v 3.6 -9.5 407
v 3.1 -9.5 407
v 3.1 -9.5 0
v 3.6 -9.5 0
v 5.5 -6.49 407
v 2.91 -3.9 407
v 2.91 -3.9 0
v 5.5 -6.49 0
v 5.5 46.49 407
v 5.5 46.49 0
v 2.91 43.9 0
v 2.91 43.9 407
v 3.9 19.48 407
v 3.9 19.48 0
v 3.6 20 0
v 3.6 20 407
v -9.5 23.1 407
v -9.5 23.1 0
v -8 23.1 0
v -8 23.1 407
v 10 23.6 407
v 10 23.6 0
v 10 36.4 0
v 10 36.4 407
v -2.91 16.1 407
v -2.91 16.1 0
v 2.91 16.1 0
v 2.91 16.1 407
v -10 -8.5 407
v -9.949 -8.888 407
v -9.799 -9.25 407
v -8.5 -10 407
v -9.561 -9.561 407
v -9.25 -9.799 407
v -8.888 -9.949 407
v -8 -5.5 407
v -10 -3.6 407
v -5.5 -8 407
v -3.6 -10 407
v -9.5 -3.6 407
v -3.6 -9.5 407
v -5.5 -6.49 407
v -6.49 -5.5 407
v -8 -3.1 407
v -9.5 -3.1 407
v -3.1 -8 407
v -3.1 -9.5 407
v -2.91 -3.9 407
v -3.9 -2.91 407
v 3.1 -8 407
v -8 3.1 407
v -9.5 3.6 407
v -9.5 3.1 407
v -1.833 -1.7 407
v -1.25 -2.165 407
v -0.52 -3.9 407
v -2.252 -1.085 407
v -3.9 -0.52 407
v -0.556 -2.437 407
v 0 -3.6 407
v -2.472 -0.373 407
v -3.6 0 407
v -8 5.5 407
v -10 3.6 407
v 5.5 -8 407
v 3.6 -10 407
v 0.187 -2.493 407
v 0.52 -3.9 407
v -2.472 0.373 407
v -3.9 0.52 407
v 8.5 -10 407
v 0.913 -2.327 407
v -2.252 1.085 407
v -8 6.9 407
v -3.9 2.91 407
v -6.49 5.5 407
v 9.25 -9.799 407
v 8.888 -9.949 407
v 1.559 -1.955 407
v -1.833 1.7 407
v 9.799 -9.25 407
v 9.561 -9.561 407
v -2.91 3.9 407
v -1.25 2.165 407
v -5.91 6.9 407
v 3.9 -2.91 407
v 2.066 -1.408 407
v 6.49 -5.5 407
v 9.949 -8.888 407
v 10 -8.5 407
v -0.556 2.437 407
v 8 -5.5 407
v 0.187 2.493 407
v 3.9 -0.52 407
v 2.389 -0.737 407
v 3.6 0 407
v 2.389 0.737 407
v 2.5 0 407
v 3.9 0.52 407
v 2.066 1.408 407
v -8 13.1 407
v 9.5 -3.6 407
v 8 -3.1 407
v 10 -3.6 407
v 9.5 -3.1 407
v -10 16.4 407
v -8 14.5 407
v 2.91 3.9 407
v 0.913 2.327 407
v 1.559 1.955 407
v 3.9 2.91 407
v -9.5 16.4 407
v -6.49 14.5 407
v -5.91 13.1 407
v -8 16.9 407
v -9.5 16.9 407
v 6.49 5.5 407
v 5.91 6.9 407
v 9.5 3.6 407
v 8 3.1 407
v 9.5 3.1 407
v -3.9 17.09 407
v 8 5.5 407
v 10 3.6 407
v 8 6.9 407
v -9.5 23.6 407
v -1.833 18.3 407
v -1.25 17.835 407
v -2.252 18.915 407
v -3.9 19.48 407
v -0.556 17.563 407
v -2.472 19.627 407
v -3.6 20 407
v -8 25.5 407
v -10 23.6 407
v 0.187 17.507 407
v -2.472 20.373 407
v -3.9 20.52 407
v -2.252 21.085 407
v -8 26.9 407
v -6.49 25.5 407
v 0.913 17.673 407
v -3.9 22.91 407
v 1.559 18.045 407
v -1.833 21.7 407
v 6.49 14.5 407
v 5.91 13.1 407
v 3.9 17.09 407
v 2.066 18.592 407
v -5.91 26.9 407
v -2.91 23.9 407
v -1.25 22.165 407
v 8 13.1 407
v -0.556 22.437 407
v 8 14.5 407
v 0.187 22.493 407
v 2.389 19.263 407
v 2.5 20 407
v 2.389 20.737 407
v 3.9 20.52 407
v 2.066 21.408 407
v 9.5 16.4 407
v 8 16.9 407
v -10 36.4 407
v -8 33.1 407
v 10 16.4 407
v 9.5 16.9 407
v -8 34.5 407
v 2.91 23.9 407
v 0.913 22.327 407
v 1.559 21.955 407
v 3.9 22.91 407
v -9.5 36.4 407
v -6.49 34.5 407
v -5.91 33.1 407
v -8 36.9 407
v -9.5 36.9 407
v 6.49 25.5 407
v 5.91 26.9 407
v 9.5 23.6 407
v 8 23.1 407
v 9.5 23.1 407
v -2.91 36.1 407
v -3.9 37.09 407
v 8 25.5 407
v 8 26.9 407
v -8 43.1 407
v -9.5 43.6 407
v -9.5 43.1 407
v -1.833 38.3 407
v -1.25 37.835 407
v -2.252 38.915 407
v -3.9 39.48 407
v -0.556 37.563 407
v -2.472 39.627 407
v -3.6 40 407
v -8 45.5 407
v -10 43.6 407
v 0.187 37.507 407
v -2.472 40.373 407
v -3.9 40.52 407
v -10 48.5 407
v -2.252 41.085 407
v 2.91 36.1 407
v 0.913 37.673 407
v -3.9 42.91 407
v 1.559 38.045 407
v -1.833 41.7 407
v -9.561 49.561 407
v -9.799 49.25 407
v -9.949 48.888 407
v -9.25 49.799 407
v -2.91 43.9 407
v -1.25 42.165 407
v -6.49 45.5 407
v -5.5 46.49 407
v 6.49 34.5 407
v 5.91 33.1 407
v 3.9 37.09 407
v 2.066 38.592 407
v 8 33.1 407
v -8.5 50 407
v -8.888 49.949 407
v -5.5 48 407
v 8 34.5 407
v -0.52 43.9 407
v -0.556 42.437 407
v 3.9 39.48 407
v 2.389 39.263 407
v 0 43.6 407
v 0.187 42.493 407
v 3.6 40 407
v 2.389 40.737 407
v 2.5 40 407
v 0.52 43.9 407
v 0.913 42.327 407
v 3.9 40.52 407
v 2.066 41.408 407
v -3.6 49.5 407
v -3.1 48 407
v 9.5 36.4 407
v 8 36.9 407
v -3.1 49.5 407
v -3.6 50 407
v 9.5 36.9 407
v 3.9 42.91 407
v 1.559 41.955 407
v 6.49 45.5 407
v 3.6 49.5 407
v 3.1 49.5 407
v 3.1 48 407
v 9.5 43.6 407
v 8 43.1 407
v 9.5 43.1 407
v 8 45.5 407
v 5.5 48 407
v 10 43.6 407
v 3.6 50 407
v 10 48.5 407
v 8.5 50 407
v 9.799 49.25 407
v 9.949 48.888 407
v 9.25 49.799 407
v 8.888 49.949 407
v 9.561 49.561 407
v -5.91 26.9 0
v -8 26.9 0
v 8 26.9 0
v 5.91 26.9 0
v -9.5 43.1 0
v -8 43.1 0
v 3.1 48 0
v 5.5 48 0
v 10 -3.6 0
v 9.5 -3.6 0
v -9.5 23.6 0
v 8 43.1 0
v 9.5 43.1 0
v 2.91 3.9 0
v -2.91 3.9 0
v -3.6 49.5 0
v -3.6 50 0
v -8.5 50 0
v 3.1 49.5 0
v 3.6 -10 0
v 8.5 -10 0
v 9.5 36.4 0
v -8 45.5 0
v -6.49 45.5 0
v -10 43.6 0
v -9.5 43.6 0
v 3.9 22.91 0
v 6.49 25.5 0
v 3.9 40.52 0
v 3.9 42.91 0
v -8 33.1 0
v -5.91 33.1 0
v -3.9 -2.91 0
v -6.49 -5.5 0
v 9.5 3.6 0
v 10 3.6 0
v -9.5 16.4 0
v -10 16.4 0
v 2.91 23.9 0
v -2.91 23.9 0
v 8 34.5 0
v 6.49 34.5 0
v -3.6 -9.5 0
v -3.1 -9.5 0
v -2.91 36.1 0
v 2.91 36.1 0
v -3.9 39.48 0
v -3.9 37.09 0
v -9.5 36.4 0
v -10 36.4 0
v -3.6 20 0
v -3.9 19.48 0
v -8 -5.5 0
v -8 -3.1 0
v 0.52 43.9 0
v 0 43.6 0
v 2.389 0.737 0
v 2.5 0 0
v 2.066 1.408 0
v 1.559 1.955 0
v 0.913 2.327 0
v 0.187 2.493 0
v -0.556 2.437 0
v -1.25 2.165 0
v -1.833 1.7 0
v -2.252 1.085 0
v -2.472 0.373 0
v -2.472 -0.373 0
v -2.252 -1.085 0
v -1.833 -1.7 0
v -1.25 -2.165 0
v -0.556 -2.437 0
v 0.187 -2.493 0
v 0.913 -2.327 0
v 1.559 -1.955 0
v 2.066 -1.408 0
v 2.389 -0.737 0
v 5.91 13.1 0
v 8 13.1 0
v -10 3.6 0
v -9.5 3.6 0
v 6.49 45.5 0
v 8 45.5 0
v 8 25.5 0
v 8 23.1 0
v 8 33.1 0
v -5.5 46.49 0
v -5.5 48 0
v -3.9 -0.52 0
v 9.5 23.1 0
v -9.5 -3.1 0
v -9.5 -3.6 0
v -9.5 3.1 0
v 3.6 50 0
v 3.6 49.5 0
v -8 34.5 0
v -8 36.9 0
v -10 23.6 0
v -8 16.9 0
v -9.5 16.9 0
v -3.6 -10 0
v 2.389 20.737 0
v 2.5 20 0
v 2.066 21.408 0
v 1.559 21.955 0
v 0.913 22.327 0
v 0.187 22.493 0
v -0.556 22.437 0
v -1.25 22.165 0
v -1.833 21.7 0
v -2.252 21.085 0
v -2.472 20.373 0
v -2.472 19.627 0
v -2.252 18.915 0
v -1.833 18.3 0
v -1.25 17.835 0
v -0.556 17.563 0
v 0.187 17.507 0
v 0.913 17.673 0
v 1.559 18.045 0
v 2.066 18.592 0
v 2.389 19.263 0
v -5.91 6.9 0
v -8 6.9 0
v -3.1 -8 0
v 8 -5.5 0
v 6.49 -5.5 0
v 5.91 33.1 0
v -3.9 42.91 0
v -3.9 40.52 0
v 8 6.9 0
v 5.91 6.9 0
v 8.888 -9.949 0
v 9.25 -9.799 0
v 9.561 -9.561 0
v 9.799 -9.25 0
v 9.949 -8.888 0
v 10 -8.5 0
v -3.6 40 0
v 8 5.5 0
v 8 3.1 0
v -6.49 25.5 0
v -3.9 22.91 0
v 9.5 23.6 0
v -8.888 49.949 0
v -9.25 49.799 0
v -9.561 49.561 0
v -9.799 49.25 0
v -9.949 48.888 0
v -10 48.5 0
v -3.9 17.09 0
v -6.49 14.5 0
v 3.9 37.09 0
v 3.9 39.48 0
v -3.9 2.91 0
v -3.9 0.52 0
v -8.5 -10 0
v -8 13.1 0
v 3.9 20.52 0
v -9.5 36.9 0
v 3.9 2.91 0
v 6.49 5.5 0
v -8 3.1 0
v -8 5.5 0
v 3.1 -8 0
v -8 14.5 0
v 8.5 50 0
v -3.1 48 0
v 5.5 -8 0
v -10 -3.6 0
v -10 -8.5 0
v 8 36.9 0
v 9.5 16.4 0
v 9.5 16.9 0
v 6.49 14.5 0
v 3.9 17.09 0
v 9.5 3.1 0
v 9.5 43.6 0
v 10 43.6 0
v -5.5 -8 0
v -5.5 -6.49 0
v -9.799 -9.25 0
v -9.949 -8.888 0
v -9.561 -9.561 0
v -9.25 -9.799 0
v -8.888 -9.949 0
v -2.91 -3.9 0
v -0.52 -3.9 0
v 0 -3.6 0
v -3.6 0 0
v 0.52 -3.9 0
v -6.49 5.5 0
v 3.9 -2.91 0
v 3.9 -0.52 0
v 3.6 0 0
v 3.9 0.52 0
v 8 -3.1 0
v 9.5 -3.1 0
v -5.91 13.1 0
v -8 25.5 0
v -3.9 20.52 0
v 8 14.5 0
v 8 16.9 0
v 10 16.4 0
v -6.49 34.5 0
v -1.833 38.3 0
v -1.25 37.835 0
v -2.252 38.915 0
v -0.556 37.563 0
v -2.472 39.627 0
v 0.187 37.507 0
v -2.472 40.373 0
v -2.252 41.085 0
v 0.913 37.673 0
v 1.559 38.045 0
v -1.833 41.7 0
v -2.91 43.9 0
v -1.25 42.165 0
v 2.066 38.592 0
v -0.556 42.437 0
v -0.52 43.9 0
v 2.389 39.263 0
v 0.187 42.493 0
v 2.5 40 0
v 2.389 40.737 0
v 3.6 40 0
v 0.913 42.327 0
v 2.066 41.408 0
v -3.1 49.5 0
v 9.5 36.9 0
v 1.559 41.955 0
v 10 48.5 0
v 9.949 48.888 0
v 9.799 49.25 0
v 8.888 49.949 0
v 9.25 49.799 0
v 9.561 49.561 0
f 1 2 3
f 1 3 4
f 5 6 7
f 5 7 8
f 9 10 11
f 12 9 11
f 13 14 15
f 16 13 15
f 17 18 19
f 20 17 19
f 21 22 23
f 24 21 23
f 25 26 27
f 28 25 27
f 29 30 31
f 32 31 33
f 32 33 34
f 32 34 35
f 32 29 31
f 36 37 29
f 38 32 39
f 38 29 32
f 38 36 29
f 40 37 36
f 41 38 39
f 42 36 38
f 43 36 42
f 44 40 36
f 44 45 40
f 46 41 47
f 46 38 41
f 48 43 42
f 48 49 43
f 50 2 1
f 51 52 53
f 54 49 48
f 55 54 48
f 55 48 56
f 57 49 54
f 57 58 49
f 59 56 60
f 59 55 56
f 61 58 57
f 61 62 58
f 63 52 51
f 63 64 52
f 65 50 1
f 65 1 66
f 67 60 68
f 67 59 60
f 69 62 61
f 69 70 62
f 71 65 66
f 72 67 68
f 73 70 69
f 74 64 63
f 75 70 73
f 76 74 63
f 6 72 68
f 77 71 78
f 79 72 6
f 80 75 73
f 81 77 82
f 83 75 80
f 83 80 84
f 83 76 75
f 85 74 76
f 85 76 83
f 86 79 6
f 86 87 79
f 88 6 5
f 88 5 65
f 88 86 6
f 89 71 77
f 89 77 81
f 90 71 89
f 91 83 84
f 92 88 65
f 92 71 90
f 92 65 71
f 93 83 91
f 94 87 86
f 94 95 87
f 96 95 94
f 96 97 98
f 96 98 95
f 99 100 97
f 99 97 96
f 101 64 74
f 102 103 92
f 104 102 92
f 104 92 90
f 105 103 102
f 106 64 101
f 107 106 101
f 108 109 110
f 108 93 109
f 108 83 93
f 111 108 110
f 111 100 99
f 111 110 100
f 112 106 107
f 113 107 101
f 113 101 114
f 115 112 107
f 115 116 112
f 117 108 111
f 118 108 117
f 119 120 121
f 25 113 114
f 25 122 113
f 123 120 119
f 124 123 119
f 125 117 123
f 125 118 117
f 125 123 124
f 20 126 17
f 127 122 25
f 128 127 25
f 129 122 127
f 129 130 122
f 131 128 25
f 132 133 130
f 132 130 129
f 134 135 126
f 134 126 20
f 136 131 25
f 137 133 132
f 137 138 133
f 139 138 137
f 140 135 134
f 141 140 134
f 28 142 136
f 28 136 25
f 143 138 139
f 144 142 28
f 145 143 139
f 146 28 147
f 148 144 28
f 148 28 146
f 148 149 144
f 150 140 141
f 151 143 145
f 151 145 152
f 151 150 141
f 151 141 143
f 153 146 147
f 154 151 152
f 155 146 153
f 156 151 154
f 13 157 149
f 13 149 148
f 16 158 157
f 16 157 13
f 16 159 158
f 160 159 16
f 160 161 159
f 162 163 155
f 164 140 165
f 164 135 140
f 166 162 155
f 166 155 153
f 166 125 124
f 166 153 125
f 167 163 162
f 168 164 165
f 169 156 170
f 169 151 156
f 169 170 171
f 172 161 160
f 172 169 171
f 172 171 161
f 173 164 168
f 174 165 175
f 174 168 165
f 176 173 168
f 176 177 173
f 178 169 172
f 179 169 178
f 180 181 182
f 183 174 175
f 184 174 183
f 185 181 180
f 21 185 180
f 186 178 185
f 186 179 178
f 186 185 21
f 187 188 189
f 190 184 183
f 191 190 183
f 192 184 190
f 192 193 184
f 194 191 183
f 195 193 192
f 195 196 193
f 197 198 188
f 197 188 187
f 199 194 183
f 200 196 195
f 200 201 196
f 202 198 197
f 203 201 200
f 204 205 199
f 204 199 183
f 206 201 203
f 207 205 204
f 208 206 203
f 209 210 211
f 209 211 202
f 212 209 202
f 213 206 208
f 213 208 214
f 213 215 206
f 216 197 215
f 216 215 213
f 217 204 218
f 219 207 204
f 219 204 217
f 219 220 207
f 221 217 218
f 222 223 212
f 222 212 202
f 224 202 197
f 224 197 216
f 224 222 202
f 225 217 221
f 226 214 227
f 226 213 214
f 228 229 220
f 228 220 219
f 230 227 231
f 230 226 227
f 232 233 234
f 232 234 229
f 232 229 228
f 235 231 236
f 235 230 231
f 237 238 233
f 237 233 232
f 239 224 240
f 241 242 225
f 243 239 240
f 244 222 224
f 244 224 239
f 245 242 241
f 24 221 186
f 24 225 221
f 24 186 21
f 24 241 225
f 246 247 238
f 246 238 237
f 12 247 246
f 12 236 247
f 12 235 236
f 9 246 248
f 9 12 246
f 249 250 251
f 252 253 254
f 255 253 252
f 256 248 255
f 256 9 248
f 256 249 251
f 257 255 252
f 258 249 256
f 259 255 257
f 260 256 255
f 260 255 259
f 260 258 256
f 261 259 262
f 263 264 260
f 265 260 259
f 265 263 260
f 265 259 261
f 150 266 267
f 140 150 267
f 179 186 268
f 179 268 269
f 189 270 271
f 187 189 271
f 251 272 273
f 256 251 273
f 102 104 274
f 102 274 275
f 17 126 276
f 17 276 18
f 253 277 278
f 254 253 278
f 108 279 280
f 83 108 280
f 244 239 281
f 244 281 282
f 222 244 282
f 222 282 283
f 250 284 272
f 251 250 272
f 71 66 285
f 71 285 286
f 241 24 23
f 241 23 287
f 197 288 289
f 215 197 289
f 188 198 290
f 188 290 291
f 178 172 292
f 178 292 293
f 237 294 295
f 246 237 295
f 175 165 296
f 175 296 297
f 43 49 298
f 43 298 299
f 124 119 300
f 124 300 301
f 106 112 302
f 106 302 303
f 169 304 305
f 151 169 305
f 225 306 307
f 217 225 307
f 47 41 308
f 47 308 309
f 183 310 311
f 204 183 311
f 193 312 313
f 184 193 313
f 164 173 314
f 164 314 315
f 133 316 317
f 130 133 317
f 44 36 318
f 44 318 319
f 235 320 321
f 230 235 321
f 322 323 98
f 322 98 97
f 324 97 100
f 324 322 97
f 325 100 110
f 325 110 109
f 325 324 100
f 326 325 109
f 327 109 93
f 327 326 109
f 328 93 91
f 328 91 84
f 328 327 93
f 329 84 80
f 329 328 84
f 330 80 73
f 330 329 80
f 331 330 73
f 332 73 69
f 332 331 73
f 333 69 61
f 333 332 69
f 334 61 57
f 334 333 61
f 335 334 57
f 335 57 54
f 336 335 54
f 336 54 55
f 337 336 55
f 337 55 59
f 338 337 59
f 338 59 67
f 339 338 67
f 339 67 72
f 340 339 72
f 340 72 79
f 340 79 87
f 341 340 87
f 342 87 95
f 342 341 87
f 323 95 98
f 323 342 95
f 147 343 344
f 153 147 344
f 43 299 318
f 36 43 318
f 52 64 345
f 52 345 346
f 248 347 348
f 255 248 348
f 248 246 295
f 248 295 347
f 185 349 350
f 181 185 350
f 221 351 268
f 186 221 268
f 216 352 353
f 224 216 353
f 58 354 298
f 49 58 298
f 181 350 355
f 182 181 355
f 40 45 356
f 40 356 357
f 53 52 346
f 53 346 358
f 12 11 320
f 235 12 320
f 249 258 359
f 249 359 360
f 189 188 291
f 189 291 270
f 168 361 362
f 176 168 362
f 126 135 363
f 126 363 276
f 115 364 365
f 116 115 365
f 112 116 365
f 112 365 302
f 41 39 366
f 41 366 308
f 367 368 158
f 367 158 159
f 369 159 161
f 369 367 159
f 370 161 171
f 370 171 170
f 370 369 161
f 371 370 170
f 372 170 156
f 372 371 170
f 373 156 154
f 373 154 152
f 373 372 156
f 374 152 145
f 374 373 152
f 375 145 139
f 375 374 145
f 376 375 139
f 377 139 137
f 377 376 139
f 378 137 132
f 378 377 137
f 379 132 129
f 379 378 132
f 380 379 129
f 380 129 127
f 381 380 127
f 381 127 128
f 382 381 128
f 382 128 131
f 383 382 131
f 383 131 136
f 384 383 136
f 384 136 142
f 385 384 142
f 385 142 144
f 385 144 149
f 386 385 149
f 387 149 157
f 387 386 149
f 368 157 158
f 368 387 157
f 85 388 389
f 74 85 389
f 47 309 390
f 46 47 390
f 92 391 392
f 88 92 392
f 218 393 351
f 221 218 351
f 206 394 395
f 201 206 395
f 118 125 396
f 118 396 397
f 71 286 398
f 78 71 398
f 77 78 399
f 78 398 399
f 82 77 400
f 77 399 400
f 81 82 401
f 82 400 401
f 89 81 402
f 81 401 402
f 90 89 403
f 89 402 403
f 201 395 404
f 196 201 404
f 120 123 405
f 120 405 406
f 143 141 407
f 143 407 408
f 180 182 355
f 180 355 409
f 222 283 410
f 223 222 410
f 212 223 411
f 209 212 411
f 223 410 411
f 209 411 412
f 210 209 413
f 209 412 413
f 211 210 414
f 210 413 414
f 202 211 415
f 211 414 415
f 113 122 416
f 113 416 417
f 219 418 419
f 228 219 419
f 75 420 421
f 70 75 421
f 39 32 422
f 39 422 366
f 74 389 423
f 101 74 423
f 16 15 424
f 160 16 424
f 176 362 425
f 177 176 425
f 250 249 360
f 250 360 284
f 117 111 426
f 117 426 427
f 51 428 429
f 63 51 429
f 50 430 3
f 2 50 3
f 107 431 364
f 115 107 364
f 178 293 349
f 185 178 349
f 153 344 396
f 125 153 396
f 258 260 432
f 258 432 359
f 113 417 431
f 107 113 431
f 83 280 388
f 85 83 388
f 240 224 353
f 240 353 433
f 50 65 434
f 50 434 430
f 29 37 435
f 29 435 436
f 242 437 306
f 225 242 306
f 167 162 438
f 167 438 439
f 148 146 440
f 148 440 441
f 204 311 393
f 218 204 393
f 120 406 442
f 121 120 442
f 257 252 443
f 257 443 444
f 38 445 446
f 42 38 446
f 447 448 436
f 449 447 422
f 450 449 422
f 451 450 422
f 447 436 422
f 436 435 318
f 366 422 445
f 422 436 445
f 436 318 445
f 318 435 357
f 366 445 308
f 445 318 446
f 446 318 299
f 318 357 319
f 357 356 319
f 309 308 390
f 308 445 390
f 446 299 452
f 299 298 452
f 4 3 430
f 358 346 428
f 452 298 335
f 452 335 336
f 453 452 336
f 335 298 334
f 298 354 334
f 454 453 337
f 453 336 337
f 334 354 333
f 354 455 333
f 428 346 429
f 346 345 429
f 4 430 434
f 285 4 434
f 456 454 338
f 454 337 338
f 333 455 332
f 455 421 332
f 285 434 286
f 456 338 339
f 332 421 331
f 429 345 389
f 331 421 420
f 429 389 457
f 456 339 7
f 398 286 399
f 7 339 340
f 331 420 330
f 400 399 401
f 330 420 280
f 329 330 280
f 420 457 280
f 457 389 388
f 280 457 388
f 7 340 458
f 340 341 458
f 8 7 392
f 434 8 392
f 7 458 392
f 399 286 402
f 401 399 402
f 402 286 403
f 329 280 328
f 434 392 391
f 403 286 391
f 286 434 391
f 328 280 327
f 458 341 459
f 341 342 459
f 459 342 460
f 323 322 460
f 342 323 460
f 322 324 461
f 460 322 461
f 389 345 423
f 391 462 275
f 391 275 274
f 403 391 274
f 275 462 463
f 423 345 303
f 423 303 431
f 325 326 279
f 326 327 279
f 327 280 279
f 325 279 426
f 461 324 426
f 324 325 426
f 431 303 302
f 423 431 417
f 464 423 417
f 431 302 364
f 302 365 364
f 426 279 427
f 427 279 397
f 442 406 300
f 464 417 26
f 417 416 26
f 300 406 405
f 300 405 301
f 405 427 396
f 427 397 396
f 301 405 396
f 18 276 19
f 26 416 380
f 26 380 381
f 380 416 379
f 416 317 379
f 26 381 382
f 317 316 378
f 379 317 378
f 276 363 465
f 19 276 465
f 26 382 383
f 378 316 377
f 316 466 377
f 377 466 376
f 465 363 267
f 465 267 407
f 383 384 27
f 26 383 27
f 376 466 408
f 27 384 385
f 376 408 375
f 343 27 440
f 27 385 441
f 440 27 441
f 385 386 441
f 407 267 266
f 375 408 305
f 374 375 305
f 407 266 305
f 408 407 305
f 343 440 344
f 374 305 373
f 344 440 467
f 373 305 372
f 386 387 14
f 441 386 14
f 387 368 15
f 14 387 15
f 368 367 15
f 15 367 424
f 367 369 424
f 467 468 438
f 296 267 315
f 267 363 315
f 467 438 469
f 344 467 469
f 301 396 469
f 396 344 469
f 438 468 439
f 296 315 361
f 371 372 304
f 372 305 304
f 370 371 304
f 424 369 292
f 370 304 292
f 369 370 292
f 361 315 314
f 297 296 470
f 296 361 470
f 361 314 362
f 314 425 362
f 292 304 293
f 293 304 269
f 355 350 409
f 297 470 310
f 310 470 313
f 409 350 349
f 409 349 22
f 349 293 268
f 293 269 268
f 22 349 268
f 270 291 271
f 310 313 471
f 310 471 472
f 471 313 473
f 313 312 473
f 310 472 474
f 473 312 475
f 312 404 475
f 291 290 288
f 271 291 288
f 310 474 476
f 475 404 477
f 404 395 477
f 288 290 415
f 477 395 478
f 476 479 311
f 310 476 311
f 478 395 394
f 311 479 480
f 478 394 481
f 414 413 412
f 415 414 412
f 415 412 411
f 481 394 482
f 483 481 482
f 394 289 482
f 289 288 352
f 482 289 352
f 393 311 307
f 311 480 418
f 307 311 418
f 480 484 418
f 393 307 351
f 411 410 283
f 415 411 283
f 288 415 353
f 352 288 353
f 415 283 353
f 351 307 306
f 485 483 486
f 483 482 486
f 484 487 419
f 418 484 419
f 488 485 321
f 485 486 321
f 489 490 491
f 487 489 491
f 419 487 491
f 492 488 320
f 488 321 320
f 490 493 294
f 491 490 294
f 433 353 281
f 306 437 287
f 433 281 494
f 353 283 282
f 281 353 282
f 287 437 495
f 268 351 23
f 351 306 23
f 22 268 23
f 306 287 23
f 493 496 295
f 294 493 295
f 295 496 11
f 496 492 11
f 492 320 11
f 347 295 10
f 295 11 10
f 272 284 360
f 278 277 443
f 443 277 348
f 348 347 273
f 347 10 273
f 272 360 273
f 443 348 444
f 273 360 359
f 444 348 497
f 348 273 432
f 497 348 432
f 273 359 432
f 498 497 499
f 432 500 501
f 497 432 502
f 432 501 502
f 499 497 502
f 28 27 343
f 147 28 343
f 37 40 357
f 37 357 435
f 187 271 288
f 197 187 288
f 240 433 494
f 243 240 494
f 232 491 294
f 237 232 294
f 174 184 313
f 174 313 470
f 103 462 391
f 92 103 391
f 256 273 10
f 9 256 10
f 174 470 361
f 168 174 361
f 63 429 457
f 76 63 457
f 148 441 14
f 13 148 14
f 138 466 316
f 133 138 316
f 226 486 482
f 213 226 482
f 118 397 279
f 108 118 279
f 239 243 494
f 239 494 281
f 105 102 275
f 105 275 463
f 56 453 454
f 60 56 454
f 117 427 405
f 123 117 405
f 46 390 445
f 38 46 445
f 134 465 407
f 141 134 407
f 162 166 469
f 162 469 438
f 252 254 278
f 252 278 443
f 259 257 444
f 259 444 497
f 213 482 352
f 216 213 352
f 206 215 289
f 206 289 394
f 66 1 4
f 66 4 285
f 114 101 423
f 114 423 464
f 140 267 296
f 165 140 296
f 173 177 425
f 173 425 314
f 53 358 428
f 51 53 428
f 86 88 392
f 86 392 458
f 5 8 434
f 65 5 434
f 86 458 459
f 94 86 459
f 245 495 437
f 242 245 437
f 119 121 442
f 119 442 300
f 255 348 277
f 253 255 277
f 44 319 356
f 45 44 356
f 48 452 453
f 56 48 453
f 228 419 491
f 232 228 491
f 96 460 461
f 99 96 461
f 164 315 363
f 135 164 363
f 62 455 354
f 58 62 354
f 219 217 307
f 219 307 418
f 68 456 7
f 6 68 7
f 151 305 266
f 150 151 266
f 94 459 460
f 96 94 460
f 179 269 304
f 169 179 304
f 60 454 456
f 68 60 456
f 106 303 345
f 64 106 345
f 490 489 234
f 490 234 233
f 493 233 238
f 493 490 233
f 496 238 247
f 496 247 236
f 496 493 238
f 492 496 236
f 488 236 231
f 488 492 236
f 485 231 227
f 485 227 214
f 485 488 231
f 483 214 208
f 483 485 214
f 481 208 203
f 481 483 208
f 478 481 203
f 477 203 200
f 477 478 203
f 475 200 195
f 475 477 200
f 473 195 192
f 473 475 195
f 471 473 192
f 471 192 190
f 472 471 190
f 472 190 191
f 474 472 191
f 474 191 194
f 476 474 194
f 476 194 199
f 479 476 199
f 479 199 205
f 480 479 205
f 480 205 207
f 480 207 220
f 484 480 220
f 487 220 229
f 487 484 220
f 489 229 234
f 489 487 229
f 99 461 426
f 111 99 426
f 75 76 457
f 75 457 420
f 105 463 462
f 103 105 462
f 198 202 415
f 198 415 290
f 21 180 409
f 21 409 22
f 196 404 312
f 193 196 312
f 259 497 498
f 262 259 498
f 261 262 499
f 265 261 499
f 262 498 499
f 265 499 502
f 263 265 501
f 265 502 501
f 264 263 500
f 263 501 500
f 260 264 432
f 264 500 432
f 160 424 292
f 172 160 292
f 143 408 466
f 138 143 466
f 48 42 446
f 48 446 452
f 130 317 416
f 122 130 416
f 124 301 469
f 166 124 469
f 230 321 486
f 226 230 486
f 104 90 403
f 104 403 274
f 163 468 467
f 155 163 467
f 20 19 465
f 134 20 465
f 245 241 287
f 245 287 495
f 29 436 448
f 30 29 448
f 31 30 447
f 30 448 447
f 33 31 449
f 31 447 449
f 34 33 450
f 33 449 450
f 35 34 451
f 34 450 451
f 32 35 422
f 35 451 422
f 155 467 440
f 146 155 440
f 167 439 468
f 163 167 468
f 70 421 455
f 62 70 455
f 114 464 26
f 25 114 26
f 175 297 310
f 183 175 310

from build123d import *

# Parameters (mm, degrees)
SKETCH_28_R     = 2.5
EXTRUDE_1_DEPTH = 407


with BuildPart() as part:
    # 草图28 → 凸台-拉伸1 (new body)
    with BuildSketch(Plane.XY):
        with BuildLine():
            Line((9.5, 36.4), (9.5, 36.9))
            Line((9.5, 36.9), (8, 36.9))
            Line((8, 36.9), (8, 34.5))
            Line((8, 34.5), (6.489949494, 34.5))
            Line((6.489949494, 34.5), (3.9, 37.089949494))
            Line((3.9, 37.089949494), (3.9, 39.480384758))
            Line((3.9, 39.480384758), (3.6, 40))
            Line((3.6, 40), (3.9, 40.519615242))
            Line((3.9, 40.519615242), (3.9, 42.910050506))
            Line((3.9, 42.910050506), (6.489949494, 45.5))
            Line((6.489949494, 45.5), (8, 45.5))
            Line((8, 45.5), (8, 43.1))
            Line((8, 43.1), (9.5, 43.1))
            Line((9.5, 43.1), (9.5, 43.6))
            Line((9.5, 43.6), (10, 43.6))
            Line((10, 43.6), (10, 48.5))
            ThreePointArc((10, 48.5), (9.560660172, 49.560660172), (8.5, 50))
            Line((8.5, 50), (3.6, 50))
            Line((3.6, 50), (3.6, 49.5))
            Line((3.6, 49.5), (3.1, 49.5))
            Line((3.1, 49.5), (3.1, 48))
            Line((3.1, 48), (5.5, 48))
            Line((5.5, 48), (5.5, 46.489949494))
            Line((5.5, 46.489949494), (2.910050506, 43.9))
            Line((2.910050506, 43.9), (0.519615242, 43.9))
            Line((0.519615242, 43.9), (0, 43.6))
            Line((0, 43.6), (-0.519615242, 43.9))
            Line((-0.519615242, 43.9), (-2.910050506, 43.9))
            Line((-2.910050506, 43.9), (-5.5, 46.489949494))
            Line((-5.5, 46.489949494), (-5.5, 48))
            Line((-5.5, 48), (-3.1, 48))
            Line((-3.1, 48), (-3.1, 49.5))
            Line((-3.1, 49.5), (-3.6, 49.5))
            Line((-3.6, 49.5), (-3.6, 50))
            Line((-3.6, 50), (-8.5, 50))
            ThreePointArc((-8.5, 50), (-9.560660172, 49.560660172), (-10, 48.5))
            Line((-10, 48.5), (-10, 43.6))
            Line((-10, 43.6), (-9.5, 43.6))
            Line((-9.5, 43.6), (-9.5, 43.1))
            Line((-9.5, 43.1), (-8, 43.1))
            Line((-8, 43.1), (-8, 45.5))
            Line((-8, 45.5), (-6.489949494, 45.5))
            Line((-6.489949494, 45.5), (-3.9, 42.910050506))
            Line((-3.9, 42.910050506), (-3.9, 40.519615242))
            Line((-3.9, 40.519615242), (-3.6, 40))
            Line((-3.6, 40), (-3.9, 39.480384758))
            Line((-3.9, 39.480384758), (-3.9, 37.089949494))
            Line((-3.9, 37.089949494), (-6.489949494, 34.5))
            Line((-6.489949494, 34.5), (-8, 34.5))
            Line((-8, 34.5), (-8, 36.9))
            Line((-8, 36.9), (-9.5, 36.9))
            Line((-9.5, 36.9), (-9.5, 36.4))
            Line((-9.5, 36.4), (-10, 36.4))
            Line((-10, 36.4), (-10, 23.6))
            Line((-10, 23.6), (-9.5, 23.6))
            Line((-9.5, 23.6), (-9.5, 23.1))
            Line((-9.5, 23.1), (-8, 23.1))
            Line((-8, 23.1), (-8, 25.5))
            Line((-8, 25.5), (-6.489949494, 25.5))
            Line((-6.489949494, 25.5), (-3.9, 22.910050506))
            Line((-3.9, 22.910050506), (-3.9, 20.519615242))
            Line((-3.9, 20.519615242), (-3.6, 20))
            Line((-3.6, 20), (-3.9, 19.480384758))
            Line((-3.9, 19.480384758), (-3.9, 17.089949494))
            Line((-3.9, 17.089949494), (-6.489949494, 14.5))
            Line((-6.489949494, 14.5), (-8, 14.5))
            Line((-8, 14.5), (-8, 16.9))
            Line((-8, 16.9), (-9.5, 16.9))
            Line((-9.5, 16.9), (-9.5, 16.4))
            Line((-9.5, 16.4), (-10, 16.4))
            Line((-10, 16.4), (-10, 3.6))
            Line((-10, 3.6), (-9.5, 3.6))
            Line((-9.5, 3.6), (-9.5, 3.1))
            Line((-9.5, 3.1), (-8, 3.1))
            Line((-8, 3.1), (-8, 5.5))
            Line((-8, 5.5), (-6.489949494, 5.5))
            Line((-6.489949494, 5.5), (-3.9, 2.910050506))
            Line((-3.9, 2.910050506), (-3.9, 0.519615242))
            Line((-3.9, 0.519615242), (-3.6, 0))
            Line((-3.6, 0), (-3.9, -0.519615242))
            Line((-3.9, -0.519615242), (-3.9, -2.910050506))
            Line((-3.9, -2.910050506), (-6.489949494, -5.5))
            Line((-6.489949494, -5.5), (-8, -5.5))
            Line((-8, -5.5), (-8, -3.1))
            Line((-8, -3.1), (-9.5, -3.1))
            Line((-9.5, -3.1), (-9.5, -3.6))
            Line((-9.5, -3.6), (-10, -3.6))
            Line((-10, -3.6), (-10, -8.5))
            ThreePointArc((-10, -8.5), (-9.560660172, -9.560660172), (-8.5, -10))
            Line((-8.5, -10), (-3.6, -10))
            Line((-3.6, -10), (-3.6, -9.5))
            Line((-3.6, -9.5), (-3.1, -9.5))
            Line((-3.1, -9.5), (-3.1, -8))
            Line((-3.1, -8), (-5.5, -8))
            Line((-5.5, -8), (-5.5, -6.489949494))
            Line((-5.5, -6.489949494), (-2.910050506, -3.9))
            Line((-2.910050506, -3.9), (-0.519615242, -3.9))
            Line((-0.519615242, -3.9), (0, -3.6))
            Line((0, -3.6), (0.519615242, -3.9))
            Line((0.519615242, -3.9), (2.910050506, -3.9))
            Line((2.910050506, -3.9), (5.5, -6.489949494))
            Line((5.5, -6.489949494), (5.5, -8))
            Line((5.5, -8), (3.1, -8))
            Line((3.1, -8), (3.1, -9.5))
            Line((3.1, -9.5), (3.6, -9.5))
            Line((3.6, -9.5), (3.6, -10))
            Line((3.6, -10), (8.5, -10))
            ThreePointArc((8.5, -10), (9.560660172, -9.560660172), (10, -8.5))
            Line((10, -8.5), (10, -3.6))
            Line((10, -3.6), (9.5, -3.6))
            Line((9.5, -3.6), (9.5, -3.1))
            Line((9.5, -3.1), (8, -3.1))
            Line((8, -3.1), (8, -5.5))
            Line((8, -5.5), (6.489949494, -5.5))
            Line((6.489949494, -5.5), (3.9, -2.910050506))
            Line((3.9, -2.910050506), (3.9, -0.519615242))
            Line((3.9, -0.519615242), (3.6, 0))
            Line((3.6, 0), (3.9, 0.519615242))
            Line((3.9, 0.519615242), (3.9, 2.910050506))
            Line((3.9, 2.910050506), (6.489949494, 5.5))
            Line((6.489949494, 5.5), (8, 5.5))
            Line((8, 5.5), (8, 3.1))
            Line((8, 3.1), (9.5, 3.1))
            Line((9.5, 3.1), (9.5, 3.6))
            Line((9.5, 3.6), (10, 3.6))
            Line((10, 3.6), (10, 16.4))
            Line((10, 16.4), (9.5, 16.4))
            Line((9.5, 16.4), (9.5, 16.9))
            Line((9.5, 16.9), (8, 16.9))
            Line((8, 16.9), (8, 14.5))
            Line((8, 14.5), (6.489949494, 14.5))
            Line((6.489949494, 14.5), (3.9, 17.089949494))
            Line((3.9, 17.089949494), (3.9, 19.480384758))
            Line((3.9, 19.480384758), (3.6, 20))
            Line((3.6, 20), (3.9, 20.519615242))
            Line((3.9, 20.519615242), (3.9, 22.910050506))
            Line((3.9, 22.910050506), (6.489949494, 25.5))
            Line((6.489949494, 25.5), (8, 25.5))
            Line((8, 25.5), (8, 23.1))
            Line((8, 23.1), (9.5, 23.1))
            Line((9.5, 23.1), (9.5, 23.6))
            Line((9.5, 23.6), (10, 23.6))
            Line((10, 23.6), (10, 36.4))
            Line((10, 36.4), (9.5, 36.4))
        make_face()
        Circle(SKETCH_28_R, mode=Mode.SUBTRACT)
        with Locations((0, 20)):
            Circle(SKETCH_28_R, mode=Mode.SUBTRACT)
        with Locations((0, 40)):
            Circle(SKETCH_28_R, mode=Mode.SUBTRACT)
        Polygon((2.910050506, 16.1), (5.910050506, 13.1), (8, 13.1), (8, 6.9), (5.910050506, 6.9), (2.910050506, 3.9), (-2.910050506, 3.9), (-5.910050506, 6.9), (-8, 6.9), (-8, 13.1), (-5.910050506, 13.1), (-2.910050506, 16.1), align=None, mode=Mode.SUBTRACT)
        Polygon((5.910050506, 26.9), (2.910050506, 23.9), (-2.910050506, 23.9), (-5.910050506, 26.9), (-8, 26.9), (-8, 33.1), (-5.910050506, 33.1), (-2.910050506, 36.1), (2.910050506, 36.1), (5.910050506, 33.1), (8, 33.1), (8, 26.9), align=None, mode=Mode.SUBTRACT)
    extrude(amount=EXTRUDE_1_DEPTH)


solid = part.part
